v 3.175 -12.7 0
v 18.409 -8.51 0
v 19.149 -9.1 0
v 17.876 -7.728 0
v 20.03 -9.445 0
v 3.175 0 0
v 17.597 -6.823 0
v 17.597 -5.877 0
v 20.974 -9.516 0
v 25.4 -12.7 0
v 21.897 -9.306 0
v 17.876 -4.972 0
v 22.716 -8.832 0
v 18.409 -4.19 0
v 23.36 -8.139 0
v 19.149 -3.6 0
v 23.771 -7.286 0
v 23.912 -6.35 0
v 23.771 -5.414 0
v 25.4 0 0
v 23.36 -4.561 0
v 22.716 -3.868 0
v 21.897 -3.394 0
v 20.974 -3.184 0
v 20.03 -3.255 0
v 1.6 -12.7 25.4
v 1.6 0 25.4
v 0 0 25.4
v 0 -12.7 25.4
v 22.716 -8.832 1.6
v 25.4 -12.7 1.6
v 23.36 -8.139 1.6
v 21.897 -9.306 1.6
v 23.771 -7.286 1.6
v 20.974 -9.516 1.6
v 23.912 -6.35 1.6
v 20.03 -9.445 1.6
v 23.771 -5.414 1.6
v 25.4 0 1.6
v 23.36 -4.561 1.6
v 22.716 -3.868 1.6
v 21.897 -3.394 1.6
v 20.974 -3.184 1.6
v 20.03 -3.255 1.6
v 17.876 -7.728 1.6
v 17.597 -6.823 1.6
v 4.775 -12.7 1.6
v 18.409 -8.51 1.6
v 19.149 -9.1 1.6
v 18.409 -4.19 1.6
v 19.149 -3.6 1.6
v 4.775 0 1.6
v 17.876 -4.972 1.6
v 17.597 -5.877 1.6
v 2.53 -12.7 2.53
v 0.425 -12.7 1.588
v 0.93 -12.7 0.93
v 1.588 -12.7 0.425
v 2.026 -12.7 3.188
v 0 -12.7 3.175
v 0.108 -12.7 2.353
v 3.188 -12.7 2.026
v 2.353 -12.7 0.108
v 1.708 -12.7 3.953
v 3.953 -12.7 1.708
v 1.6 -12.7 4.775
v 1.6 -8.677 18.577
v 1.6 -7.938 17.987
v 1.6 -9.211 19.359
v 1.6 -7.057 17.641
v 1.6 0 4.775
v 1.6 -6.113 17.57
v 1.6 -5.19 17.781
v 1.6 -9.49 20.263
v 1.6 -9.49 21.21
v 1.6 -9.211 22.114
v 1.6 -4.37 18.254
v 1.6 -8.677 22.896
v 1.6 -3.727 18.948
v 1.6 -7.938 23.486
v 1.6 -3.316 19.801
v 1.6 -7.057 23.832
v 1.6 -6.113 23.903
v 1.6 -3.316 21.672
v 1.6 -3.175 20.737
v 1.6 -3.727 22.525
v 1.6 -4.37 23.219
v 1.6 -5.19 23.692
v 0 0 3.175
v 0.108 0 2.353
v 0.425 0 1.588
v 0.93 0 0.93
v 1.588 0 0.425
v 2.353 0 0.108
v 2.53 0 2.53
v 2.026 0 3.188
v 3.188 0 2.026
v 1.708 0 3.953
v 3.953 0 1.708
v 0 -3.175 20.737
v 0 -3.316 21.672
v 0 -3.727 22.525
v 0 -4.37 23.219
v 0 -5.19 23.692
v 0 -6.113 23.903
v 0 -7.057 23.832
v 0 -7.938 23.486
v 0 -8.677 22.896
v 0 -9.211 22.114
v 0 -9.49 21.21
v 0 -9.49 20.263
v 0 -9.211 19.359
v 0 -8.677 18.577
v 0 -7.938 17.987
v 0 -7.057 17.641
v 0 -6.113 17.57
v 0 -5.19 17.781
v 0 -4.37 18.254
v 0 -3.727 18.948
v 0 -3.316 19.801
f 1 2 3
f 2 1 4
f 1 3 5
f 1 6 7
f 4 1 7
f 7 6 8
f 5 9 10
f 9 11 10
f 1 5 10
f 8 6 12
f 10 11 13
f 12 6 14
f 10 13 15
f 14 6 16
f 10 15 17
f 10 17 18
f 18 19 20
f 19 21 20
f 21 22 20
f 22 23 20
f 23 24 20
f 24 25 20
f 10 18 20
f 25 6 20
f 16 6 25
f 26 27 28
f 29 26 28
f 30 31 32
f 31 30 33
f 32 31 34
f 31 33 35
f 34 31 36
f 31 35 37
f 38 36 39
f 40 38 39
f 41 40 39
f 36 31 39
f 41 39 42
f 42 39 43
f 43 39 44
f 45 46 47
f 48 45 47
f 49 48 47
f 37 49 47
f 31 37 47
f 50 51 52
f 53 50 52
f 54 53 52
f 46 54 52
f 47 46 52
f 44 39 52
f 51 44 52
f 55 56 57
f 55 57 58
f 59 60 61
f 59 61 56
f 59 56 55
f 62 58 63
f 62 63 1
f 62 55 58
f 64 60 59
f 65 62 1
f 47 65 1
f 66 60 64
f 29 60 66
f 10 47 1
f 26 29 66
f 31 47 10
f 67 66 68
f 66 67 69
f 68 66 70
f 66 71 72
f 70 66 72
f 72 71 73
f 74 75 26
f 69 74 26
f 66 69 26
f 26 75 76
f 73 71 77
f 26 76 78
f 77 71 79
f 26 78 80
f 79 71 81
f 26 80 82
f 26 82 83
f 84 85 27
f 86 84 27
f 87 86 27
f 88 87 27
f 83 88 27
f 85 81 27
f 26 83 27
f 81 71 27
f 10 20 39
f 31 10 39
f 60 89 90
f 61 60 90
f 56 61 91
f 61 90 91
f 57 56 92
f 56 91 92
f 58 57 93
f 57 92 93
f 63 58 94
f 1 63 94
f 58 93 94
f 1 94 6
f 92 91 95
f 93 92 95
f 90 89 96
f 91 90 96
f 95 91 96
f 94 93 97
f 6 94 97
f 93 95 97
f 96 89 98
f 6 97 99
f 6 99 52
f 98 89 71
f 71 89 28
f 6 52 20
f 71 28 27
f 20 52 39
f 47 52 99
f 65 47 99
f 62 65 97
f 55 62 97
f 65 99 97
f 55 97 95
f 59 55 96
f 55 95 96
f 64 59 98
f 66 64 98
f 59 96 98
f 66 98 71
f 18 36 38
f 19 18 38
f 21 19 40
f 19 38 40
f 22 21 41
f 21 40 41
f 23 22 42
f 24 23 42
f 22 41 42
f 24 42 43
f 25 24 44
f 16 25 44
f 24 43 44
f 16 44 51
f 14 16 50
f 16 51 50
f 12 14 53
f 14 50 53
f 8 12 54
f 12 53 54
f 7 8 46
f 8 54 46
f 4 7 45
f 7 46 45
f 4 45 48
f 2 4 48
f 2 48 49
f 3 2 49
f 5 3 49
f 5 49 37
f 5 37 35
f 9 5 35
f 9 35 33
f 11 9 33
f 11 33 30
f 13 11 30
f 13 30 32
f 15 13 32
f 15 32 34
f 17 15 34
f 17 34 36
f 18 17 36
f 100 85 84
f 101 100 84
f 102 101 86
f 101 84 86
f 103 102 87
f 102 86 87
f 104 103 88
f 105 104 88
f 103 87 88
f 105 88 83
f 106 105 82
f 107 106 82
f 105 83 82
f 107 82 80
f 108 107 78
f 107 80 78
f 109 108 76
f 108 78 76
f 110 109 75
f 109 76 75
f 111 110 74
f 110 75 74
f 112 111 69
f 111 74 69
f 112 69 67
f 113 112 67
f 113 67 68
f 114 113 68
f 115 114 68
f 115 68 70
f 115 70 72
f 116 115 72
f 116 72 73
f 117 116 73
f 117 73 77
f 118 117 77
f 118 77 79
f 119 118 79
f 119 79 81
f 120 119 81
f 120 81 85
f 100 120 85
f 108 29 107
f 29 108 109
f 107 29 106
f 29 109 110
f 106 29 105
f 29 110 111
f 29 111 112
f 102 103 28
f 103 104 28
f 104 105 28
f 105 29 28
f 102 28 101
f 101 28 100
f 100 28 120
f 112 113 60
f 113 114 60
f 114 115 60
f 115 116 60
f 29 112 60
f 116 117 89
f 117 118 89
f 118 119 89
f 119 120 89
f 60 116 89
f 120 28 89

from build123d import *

# Parameters (mm, degrees)
F1_DEPTH = 12.7
F2_R     = 3.175
F3_DEPTH = 25.4
F4_R     = 3.175
F5_DEPTH = 25.4


with BuildPart() as f1:
    # F0 (on Front) → F1 (new body)
    with BuildSketch(Plane.XZ):
        with BuildLine():
            Line((0, 25.4), (0, 3.175))
            ThreePointArc((0, 3.175), (0.929936, 0.929936), (3.175, 0))
            Line((3.175, 0), (25.4, 0))
            Line((25.4, 0), (25.4, 1.6002))
            Line((25.4, 1.6002), (4.7752, 1.6002))
            ThreePointArc((4.7752, 1.6002), (2.530136, 2.530136), (1.6002, 4.7752))
            Line((1.6002, 4.7752), (1.6002, 25.4))
            Line((1.6002, 25.4), (0, 25.4))
        make_face()
    extrude(amount=F1_DEPTH)

    # F2 (on face) → F3 (cut)
    with BuildSketch(Plane.XY.offset(1.6002)):
        with Locations((20.73656, -6.35)):
            Circle(F2_R)
    extrude(amount=-F3_DEPTH, mode=Mode.SUBTRACT)

    # F4 (on face) → F5 (cut)
    with BuildSketch(Plane.YZ.offset(1.6002)):
        with Locations((-6.35, 20.73656)):
            Circle(F4_R)
    extrude(amount=-F5_DEPTH, mode=Mode.SUBTRACT)


solid = f1.part
